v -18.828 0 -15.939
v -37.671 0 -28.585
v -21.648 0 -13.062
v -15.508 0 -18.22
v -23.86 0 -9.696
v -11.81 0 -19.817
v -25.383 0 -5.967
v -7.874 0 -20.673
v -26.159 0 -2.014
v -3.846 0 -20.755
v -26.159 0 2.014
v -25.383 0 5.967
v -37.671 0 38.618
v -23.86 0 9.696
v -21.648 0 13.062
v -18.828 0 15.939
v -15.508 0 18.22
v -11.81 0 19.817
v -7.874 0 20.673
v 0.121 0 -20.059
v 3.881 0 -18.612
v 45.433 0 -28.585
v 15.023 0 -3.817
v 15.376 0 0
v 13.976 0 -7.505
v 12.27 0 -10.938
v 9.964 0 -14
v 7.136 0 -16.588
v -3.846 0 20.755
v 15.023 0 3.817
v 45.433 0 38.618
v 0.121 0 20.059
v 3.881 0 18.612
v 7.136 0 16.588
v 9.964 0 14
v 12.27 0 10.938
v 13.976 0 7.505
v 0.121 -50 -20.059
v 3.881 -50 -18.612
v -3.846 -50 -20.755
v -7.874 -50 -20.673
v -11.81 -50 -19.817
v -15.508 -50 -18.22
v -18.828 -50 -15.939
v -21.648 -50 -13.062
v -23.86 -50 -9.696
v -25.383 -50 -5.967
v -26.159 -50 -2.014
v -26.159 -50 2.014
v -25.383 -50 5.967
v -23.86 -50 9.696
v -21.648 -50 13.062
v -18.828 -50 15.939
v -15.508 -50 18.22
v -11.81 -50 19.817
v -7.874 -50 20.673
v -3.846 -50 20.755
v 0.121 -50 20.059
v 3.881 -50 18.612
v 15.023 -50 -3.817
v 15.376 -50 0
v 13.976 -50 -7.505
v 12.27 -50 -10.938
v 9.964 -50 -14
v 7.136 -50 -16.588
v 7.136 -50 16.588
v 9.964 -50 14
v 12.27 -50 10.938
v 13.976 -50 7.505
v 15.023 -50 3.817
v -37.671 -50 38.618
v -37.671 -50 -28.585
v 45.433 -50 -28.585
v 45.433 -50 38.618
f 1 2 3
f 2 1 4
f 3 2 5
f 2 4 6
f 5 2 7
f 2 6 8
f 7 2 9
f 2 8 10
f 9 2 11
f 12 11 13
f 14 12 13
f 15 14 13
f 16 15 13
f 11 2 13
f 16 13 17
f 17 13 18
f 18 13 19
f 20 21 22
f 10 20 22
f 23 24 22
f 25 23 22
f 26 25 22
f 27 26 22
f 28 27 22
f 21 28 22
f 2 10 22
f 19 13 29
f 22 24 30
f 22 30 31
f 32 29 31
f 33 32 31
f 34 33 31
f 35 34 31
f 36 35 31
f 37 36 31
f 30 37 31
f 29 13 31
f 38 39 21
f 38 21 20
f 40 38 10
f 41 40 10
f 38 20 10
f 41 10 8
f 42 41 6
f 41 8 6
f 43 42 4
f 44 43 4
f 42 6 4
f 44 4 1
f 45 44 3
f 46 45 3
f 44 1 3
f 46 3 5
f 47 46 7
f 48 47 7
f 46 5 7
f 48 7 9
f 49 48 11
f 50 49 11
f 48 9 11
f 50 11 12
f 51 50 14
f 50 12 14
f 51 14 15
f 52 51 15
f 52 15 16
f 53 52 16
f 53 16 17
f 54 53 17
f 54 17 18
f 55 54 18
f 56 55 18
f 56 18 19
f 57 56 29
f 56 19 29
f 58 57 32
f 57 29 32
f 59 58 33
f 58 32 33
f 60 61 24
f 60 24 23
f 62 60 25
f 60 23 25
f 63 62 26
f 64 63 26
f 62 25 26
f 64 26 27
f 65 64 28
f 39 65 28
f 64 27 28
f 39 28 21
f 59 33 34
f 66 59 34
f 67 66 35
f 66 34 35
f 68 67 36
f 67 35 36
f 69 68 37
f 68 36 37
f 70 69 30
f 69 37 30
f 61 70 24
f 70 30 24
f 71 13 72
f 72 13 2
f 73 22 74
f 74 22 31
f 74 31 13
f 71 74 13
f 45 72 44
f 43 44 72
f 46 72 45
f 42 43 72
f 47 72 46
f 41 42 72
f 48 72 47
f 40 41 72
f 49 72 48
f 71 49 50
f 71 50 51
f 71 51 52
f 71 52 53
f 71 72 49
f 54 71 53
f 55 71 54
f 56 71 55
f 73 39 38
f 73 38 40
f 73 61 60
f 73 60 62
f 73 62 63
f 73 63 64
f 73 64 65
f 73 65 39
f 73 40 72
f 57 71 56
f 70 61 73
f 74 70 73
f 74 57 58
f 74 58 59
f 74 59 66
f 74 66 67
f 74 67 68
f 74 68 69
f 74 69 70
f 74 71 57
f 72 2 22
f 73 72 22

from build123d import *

# Parameters (mm, degrees)
F1_DEPTH = 50


with BuildPart() as f1:
    # F0 (on Front) → F1 (new body)
    with BuildSketch(Plane.XZ):
        with BuildLine():
            Line((3.880708, 38.61779), (-37.671275, 38.61779))
            Line((-37.671275, 38.61779), (-37.671275, -28.584737))
            Line((-37.671275, -28.584737), (3.880708, -28.584737))
            Line((3.880708, -28.584737), (3.880708, -18.612372))
            ThreePointArc((3.880708, -18.612372), (-26.25631, 0), (3.880708, 18.612372))
            Line((3.880708, 18.612372), (3.880708, 38.61779))
        make_face()
        with BuildLine():
            Line((45.432691, 38.61779), (3.880708, 38.61779))
            Line((3.880708, 38.61779), (3.880708, 18.612372))
            ThreePointArc((3.880708, 18.612372), (12.270213, 10.937914), (15.375554, 0))
            ThreePointArc((15.375554, 0), (12.270213, -10.937914), (3.880708, -18.612372))
            Line((3.880708, -18.612372), (3.880708, -28.584737))
            Line((3.880708, -28.584737), (45.432691, -28.584737))
            Line((45.432691, -28.584737), (45.432691, 38.61779))
        make_face()
    extrude(amount=F1_DEPTH)


solid = f1.part
